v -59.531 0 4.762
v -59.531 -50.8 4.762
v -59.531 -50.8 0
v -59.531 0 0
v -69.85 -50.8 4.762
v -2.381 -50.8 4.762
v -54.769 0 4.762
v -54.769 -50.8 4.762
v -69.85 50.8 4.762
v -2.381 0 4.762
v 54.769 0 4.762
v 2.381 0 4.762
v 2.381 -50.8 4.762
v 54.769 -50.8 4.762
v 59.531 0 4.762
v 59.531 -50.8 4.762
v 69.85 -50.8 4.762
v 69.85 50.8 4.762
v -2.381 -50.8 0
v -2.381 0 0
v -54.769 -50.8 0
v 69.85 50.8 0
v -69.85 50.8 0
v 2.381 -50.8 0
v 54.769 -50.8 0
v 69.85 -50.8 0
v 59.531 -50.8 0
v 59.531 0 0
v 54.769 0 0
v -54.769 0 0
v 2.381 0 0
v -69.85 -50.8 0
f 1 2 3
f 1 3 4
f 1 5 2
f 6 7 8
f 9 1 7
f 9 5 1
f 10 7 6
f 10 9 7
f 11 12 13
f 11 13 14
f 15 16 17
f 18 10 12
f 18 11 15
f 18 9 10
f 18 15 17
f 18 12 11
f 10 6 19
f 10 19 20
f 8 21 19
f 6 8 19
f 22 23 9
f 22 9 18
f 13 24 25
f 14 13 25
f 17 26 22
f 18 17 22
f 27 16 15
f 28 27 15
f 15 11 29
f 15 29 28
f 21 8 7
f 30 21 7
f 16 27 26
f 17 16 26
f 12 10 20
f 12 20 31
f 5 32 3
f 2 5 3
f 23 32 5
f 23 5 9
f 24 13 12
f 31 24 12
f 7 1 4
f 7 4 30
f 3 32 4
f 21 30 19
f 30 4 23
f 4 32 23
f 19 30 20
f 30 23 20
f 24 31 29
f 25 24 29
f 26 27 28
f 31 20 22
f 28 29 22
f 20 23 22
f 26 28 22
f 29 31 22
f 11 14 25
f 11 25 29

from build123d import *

# Parameters (mm, degrees)
SKETCH1_W           = 139.7
SKETCH1_H           = 101.6
BOSS_EXTRUDE1_DEPTH = 4.7625
SKETCH2_W           = 4.7625
SKETCH2_H           = 101.6
CUT_EXTRUDE1_DEPTH  = 87.500542809
LPATTERN1_COUNT     = 3
LPATTERN1_PITCH     = 57.15


with BuildPart() as part:
    # Sketch1 → Boss-Extrude1 (new body)
    with BuildSketch(Plane.XY):
        Rectangle(SKETCH1_W, SKETCH1_H)
    extrude(amount=BOSS_EXTRUDE1_DEPTH)

    # Sketch2 → Cut-Extrude1 (cut, through all)
    with BuildSketch(Plane.XY.offset(4.7625)):
        with Locations((-57.15, -50.8)):
            Rectangle(SKETCH2_W, SKETCH2_H)
    cut_extrude1 = extrude(amount=-CUT_EXTRUDE1_DEPTH, mode=Mode.SUBTRACT)

    # LPattern1: Cut-Extrude1 ×3
    with Locations(*[(i * LPATTERN1_PITCH, 0, 0) for i in range(1, LPATTERN1_COUNT)]):
        add(cut_extrude1, mode=Mode.SUBTRACT)


solid = part.part
